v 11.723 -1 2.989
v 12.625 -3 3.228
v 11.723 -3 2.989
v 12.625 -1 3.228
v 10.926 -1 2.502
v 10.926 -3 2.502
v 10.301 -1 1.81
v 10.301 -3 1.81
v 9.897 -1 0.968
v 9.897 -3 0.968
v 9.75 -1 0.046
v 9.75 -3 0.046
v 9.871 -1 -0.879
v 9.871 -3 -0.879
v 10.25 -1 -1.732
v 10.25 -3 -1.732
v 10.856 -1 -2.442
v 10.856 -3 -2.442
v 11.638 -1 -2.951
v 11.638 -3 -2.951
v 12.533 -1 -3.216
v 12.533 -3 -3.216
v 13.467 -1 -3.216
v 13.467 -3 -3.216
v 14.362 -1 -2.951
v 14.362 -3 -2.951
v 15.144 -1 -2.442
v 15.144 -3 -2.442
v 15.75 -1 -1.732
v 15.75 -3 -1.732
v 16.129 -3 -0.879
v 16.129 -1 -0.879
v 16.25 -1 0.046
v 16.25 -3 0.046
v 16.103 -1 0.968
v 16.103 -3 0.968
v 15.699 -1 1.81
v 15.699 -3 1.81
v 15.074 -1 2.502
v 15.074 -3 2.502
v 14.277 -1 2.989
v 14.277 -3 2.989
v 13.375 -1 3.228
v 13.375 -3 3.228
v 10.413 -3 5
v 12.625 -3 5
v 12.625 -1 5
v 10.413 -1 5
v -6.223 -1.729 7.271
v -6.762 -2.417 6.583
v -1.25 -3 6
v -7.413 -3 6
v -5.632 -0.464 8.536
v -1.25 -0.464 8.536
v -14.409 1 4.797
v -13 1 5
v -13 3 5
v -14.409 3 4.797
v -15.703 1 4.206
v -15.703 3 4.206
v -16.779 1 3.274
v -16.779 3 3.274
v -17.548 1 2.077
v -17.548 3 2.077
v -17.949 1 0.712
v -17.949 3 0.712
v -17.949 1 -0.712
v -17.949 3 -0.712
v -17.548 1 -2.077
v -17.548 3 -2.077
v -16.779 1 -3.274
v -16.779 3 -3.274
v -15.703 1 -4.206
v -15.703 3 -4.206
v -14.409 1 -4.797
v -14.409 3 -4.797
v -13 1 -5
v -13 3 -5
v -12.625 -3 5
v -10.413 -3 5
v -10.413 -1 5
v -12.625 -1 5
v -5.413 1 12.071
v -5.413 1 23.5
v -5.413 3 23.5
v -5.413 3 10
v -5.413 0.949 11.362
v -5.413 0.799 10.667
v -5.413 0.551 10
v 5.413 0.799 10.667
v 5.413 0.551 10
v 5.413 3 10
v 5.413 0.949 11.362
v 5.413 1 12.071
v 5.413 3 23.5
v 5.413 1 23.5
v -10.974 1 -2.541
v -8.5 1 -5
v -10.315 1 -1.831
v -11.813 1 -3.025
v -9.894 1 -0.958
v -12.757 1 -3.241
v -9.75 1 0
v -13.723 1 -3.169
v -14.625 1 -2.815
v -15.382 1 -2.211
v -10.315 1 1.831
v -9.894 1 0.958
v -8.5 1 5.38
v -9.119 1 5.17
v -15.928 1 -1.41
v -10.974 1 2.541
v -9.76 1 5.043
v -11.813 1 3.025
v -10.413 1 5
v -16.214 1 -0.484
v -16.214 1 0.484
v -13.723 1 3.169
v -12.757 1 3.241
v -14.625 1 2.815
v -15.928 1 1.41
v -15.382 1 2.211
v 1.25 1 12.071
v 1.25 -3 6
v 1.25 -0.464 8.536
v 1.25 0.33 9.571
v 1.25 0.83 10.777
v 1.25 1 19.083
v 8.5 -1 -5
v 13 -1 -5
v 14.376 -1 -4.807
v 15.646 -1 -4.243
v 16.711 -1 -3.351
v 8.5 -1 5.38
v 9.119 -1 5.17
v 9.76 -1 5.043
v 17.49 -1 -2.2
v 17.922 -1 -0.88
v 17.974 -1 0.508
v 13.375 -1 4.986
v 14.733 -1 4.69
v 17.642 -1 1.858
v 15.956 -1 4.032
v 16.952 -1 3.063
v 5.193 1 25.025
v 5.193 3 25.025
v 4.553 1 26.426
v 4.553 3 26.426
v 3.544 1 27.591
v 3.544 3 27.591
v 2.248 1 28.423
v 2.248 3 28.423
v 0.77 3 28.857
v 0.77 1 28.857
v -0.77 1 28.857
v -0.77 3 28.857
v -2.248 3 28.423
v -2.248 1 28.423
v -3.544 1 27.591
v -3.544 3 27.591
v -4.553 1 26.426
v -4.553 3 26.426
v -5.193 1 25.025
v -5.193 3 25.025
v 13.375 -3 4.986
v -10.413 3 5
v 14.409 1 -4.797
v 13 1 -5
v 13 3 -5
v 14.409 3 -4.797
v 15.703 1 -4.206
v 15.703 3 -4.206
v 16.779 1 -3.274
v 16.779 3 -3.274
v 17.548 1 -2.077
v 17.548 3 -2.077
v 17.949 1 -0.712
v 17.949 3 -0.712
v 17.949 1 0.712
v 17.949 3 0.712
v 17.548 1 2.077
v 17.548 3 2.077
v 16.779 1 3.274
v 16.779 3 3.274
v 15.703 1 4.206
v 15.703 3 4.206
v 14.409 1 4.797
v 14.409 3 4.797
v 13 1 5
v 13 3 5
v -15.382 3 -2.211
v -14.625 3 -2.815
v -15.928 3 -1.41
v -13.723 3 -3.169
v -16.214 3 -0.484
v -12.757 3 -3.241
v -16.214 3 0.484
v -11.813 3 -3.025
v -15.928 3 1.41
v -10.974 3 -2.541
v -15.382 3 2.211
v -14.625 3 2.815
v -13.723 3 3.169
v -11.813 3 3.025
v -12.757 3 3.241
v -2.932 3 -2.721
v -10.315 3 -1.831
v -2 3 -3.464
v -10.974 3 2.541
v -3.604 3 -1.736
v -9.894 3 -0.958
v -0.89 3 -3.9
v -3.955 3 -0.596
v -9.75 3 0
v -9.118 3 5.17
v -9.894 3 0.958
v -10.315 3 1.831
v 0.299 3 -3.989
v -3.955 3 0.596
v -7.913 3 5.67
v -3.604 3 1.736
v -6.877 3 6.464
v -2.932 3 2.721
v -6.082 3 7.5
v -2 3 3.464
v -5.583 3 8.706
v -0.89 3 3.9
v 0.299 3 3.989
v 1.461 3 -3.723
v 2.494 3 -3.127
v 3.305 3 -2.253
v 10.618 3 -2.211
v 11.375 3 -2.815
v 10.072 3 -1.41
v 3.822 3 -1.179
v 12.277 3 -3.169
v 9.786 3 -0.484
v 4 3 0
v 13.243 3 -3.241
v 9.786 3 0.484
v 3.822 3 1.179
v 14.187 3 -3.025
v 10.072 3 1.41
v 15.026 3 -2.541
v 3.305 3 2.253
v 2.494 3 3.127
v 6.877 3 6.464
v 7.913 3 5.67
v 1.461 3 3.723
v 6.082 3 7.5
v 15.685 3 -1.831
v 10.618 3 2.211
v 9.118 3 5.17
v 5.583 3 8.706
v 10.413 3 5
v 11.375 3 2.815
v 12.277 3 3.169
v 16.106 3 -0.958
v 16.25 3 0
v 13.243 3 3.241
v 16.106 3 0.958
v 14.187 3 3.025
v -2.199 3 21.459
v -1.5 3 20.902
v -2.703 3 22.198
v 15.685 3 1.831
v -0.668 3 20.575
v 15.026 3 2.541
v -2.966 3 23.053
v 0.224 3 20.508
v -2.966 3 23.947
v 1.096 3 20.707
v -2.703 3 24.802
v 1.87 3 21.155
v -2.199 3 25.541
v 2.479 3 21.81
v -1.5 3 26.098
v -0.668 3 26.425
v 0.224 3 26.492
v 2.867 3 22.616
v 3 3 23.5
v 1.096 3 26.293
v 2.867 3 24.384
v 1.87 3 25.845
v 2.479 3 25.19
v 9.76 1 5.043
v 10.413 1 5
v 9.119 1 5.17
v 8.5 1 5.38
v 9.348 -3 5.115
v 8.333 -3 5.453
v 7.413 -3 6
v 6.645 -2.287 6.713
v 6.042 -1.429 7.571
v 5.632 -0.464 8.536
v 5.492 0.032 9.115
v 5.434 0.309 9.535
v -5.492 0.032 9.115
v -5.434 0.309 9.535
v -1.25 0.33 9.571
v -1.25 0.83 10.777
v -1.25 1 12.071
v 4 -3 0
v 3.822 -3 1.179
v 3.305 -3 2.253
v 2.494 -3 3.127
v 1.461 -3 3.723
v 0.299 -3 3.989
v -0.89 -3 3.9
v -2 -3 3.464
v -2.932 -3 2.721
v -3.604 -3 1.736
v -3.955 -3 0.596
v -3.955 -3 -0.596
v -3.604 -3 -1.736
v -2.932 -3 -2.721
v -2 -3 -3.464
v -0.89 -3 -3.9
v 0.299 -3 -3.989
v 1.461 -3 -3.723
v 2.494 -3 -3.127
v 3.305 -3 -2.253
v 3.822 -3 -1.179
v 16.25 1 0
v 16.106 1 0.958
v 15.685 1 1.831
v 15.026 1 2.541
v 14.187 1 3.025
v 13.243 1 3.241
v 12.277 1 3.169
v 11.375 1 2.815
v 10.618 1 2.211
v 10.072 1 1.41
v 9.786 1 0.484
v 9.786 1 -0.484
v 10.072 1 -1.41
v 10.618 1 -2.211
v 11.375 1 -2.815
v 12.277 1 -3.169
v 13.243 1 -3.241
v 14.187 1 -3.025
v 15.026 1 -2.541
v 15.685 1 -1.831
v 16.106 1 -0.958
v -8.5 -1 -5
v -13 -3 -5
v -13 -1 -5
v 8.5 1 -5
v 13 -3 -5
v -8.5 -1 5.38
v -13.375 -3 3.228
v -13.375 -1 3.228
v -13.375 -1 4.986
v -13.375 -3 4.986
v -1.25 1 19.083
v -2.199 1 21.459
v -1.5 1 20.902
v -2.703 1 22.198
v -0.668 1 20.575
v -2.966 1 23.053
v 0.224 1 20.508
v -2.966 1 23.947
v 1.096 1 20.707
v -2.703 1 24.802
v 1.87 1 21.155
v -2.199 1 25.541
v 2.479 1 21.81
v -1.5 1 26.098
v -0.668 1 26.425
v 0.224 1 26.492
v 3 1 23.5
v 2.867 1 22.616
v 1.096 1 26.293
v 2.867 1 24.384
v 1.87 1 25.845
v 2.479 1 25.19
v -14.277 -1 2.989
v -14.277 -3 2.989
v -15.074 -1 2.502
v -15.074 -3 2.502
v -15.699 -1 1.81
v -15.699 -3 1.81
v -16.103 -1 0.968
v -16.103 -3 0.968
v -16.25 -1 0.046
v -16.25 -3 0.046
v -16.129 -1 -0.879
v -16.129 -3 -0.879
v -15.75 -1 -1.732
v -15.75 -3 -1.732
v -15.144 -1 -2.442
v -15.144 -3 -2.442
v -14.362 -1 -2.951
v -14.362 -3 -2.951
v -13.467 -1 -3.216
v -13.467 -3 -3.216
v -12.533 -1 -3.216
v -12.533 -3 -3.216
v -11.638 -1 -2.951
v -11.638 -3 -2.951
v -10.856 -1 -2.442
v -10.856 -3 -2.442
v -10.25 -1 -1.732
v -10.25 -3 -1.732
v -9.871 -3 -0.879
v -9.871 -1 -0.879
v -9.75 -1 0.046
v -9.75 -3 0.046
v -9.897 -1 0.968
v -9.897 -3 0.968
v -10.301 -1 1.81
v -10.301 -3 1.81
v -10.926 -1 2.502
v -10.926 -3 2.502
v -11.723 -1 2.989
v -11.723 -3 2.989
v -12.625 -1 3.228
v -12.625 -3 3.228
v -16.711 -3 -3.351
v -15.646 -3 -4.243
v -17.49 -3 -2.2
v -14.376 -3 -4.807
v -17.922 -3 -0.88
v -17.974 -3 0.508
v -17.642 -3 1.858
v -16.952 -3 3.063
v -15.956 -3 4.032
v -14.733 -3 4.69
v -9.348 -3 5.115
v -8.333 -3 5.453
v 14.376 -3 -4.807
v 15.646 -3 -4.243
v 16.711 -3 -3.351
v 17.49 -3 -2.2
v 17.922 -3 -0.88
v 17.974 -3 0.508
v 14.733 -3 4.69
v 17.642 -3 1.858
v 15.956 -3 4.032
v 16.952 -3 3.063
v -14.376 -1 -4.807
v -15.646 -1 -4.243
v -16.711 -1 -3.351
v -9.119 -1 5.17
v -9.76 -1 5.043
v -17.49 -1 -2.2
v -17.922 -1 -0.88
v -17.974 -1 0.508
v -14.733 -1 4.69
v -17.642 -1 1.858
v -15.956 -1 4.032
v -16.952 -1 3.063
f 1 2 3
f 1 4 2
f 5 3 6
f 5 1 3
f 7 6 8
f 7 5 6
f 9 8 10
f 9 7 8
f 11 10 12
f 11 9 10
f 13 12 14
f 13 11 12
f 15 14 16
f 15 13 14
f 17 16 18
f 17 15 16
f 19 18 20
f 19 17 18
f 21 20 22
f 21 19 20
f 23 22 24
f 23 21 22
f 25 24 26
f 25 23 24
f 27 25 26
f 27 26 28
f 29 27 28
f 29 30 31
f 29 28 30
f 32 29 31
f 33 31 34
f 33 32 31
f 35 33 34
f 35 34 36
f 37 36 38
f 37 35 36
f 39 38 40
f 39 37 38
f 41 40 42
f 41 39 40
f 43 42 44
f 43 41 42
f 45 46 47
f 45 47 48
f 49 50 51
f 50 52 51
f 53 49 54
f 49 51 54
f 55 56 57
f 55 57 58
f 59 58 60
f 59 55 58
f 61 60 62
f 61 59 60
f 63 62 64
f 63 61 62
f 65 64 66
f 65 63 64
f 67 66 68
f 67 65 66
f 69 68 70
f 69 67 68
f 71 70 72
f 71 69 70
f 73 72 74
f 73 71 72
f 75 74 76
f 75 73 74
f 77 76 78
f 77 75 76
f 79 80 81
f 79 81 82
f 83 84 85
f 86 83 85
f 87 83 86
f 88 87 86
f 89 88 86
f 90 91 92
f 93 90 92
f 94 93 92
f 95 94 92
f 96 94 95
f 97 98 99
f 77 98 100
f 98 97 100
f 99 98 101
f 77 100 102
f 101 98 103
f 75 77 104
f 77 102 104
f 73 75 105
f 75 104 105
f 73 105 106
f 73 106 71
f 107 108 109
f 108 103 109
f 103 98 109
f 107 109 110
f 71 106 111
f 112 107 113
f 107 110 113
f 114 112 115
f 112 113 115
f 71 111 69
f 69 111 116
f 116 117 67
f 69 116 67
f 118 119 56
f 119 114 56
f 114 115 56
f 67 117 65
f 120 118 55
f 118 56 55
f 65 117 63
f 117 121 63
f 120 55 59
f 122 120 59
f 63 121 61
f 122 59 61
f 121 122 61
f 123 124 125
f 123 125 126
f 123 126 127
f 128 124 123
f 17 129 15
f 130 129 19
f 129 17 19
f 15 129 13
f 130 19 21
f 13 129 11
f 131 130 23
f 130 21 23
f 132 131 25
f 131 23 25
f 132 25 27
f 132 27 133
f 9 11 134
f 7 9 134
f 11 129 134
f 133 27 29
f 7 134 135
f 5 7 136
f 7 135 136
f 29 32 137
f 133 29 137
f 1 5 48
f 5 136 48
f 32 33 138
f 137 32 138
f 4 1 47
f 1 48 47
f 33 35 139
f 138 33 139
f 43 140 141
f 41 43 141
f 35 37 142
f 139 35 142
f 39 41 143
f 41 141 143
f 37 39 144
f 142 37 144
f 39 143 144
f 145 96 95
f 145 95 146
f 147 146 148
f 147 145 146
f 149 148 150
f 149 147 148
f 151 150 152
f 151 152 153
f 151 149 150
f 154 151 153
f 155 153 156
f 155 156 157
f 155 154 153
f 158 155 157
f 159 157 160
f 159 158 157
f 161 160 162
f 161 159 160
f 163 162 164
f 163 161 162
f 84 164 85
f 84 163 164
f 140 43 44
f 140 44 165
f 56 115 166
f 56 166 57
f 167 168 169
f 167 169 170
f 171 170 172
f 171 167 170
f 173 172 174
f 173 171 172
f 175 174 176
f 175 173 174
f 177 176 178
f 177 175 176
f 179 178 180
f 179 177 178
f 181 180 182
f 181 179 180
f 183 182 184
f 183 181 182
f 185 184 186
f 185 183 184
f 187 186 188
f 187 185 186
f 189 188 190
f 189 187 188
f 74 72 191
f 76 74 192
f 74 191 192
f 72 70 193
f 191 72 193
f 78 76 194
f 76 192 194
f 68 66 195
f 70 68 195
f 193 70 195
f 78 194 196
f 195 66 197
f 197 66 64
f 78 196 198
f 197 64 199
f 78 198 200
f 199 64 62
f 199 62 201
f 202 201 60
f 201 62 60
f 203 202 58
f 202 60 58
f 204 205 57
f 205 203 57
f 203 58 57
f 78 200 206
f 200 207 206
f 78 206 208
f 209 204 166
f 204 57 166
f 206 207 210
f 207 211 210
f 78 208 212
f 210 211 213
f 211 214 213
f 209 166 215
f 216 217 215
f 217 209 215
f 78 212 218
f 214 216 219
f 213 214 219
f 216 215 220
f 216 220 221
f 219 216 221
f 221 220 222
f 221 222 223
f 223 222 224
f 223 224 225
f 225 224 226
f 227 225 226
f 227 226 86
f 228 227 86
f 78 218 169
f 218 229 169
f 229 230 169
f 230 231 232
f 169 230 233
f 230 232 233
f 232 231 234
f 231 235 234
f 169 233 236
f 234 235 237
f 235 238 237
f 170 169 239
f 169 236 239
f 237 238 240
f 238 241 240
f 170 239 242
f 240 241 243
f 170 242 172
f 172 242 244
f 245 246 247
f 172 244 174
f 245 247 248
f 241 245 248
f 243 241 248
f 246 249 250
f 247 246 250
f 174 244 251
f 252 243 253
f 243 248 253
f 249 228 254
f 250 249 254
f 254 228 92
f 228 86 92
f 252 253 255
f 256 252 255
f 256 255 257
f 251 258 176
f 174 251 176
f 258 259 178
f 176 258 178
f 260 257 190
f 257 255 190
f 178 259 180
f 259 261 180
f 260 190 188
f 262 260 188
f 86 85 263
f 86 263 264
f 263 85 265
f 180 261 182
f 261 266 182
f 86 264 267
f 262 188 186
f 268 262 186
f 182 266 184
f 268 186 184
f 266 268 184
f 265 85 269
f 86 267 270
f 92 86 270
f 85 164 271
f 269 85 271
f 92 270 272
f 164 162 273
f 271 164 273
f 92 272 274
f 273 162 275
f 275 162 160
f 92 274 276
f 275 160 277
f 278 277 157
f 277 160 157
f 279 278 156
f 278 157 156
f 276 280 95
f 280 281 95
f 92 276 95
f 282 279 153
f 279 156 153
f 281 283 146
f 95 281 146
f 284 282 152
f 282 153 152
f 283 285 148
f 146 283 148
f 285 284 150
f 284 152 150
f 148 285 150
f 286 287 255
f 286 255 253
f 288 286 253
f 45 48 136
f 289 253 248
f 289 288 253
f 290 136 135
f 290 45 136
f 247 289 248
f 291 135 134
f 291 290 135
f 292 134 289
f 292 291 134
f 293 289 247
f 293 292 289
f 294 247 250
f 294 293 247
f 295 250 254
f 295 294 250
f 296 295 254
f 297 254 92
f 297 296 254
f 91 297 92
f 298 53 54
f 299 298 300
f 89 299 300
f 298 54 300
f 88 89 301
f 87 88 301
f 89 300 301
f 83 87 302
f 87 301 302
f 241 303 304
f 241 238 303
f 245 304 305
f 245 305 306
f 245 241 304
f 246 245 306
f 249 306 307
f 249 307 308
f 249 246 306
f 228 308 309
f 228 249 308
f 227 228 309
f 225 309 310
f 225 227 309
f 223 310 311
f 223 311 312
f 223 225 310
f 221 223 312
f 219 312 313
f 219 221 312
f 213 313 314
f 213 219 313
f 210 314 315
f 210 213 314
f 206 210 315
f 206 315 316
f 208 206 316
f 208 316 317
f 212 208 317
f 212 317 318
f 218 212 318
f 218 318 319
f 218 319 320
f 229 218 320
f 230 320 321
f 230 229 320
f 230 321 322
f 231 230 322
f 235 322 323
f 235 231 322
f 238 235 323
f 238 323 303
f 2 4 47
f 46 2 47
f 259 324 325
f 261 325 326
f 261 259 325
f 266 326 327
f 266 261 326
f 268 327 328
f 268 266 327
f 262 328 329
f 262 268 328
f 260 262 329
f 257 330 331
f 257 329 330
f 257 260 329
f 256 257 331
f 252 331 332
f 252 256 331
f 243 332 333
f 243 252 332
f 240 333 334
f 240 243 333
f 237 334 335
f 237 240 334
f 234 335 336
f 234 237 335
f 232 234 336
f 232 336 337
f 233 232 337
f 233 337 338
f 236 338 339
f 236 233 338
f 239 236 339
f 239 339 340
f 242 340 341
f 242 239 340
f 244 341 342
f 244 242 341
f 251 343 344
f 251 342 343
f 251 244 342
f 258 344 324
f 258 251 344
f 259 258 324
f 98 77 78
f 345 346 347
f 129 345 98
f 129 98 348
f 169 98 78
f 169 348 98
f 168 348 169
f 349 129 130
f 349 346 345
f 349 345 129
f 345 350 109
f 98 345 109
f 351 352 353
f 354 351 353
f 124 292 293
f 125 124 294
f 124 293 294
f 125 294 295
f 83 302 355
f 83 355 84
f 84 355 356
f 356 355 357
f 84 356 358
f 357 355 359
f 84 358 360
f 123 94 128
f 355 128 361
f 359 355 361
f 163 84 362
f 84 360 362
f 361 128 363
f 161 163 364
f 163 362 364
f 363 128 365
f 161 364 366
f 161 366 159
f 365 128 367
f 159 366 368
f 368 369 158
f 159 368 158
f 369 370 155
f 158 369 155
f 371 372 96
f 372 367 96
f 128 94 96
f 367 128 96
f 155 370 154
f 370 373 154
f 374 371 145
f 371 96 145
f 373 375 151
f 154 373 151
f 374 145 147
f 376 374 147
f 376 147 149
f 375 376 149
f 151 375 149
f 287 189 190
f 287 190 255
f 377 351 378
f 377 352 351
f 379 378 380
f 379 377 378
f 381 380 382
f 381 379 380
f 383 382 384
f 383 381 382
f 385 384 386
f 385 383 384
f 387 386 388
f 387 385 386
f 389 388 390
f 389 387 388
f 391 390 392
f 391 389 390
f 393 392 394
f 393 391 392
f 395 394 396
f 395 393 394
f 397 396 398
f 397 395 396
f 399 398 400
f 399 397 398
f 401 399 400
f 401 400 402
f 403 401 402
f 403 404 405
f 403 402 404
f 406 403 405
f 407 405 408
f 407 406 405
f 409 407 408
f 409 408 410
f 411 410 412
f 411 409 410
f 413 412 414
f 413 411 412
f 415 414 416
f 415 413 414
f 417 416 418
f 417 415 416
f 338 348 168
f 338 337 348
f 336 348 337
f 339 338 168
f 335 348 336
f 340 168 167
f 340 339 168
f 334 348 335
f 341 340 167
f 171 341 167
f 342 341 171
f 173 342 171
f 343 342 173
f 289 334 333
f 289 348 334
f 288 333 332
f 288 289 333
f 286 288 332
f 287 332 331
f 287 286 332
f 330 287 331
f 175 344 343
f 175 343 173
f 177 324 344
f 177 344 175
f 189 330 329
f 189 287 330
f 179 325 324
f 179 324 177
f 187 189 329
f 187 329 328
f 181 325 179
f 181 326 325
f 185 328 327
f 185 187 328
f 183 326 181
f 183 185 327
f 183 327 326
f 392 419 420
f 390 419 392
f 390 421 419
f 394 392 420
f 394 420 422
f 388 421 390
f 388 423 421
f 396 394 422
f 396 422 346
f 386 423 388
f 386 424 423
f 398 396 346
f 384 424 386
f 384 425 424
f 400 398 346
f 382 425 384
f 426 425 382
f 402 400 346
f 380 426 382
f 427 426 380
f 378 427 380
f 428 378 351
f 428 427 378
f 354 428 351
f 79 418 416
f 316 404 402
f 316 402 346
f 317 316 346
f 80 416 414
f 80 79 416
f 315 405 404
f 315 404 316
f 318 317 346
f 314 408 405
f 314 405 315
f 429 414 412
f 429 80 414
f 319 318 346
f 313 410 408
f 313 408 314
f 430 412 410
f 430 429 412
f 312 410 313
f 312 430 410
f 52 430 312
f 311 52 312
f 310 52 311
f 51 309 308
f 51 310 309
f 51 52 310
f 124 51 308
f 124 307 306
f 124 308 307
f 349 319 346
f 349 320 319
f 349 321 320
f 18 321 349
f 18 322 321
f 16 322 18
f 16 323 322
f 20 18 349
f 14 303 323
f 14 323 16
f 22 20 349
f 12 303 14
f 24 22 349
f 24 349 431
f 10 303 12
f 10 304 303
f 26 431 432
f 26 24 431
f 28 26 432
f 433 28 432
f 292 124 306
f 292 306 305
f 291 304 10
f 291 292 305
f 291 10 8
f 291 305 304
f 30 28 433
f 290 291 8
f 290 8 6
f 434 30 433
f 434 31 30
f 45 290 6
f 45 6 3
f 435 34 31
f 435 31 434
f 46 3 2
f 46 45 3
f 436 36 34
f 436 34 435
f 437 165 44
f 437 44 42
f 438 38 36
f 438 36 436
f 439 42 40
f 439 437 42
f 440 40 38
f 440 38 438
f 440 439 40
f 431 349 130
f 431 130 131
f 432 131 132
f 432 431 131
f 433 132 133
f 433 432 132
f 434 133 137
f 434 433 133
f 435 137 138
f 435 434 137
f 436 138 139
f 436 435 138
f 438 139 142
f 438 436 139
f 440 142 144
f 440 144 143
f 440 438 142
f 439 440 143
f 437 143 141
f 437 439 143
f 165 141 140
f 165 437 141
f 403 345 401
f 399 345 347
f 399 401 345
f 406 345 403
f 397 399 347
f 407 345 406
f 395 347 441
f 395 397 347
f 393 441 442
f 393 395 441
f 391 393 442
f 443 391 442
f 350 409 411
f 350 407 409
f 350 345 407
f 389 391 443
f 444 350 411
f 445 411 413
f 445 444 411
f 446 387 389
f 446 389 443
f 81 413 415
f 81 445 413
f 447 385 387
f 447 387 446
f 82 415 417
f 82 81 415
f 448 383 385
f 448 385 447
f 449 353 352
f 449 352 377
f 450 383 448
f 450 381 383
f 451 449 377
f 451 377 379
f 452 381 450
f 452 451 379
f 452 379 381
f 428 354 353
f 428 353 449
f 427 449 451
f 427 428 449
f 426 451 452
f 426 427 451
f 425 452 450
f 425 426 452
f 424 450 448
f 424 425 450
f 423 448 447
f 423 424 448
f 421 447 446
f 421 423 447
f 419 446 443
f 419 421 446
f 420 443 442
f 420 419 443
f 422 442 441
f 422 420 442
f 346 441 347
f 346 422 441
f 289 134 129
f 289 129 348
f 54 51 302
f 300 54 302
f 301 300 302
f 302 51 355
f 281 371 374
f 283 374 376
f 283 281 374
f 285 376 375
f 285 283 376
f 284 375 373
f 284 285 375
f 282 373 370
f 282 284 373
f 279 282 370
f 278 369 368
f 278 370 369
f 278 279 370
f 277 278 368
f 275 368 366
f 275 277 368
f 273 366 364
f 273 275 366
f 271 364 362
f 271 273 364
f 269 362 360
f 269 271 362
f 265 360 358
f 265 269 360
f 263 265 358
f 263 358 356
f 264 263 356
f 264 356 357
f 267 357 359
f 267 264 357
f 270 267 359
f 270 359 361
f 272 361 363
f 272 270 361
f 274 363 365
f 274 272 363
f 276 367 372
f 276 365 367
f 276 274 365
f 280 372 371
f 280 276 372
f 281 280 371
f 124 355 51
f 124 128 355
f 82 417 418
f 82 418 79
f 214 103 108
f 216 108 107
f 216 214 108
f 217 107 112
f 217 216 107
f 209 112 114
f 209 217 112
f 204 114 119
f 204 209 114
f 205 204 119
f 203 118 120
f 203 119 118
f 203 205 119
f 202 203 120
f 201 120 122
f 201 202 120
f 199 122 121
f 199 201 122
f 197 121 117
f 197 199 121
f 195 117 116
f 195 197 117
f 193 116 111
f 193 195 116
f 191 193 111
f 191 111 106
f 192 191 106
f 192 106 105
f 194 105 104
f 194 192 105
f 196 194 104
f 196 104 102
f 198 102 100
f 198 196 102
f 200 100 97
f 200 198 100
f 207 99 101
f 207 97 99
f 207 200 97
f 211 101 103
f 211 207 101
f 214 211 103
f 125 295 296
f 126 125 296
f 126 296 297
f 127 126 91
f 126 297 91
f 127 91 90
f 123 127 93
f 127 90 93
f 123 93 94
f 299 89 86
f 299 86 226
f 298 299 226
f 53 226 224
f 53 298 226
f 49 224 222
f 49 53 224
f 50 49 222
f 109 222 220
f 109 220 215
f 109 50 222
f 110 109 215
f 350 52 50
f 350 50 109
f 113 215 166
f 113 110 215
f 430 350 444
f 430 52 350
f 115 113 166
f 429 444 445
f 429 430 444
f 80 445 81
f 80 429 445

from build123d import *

# Parameters (mm, degrees)
F0_R     = 3.25
F0_R_2   = 4
F0_R_3   = 3
F1_DEPTH = 3
F3_DEPTH = 12.5
F5_DEPTH = 1.25
F6_W     = 9.5
F6_H     = 2
F7_DEPTH = 12.5
F8_W     = 0.75
F8_H     = 4
F9_DEPTH = 2


# Not quite as in the source:
# - a pattern or mirror of a feature is missing from the dataset's text; its kind, count and spacing are read off the source's solid


with BuildPart() as f1:
    # F0 (on Front) → F1 (new body, symmetric)
    with BuildSketch(Plane.XZ):
        with BuildLine():
            Line((-13, -5), (13, -5))
            ThreePointArc((13, -5), (18, 0), (13, 5))
            Line((13, 5), (10.4125417955, 5))
            ThreePointArc((10.4125417955, 5), (6.8770078896, 6.4644660941), (5.4125417955, 10))
            Line((5.4125417955, 10), (5.4125417955, 6))
            Line((5.4125417955, 6), (-5.4125417955, 6))
            Line((-5.4125417955, 6), (-5.4125417955, 10))
            ThreePointArc((-5.4125417955, 10), (-6.8770078896, 6.4644660941), (-10.4125417955, 5))
            Line((-10.4125417955, 5), (-13, 5))
            ThreePointArc((-13, 5), (-18, 0), (-13, -5))
        make_face()
        with Locations((-13, 0)):
            Circle(F0_R, mode=Mode.SUBTRACT)
        Circle(F0_R_2, mode=Mode.SUBTRACT)
        with Locations((13, 0)):
            Circle(F0_R, mode=Mode.SUBTRACT)
        with BuildLine():
            Line((5.4125417955, 6), (5.4125417955, 10))
            Line((5.4125417955, 10), (5.4125417955, 23.5))
            ThreePointArc((5.4125417955, 23.5), (0, 28.9125417955), (-5.4125417955, 23.5))
            Line((-5.4125417955, 23.5), (-5.4125417955, 10))
            Line((-5.4125417955, 10), (-5.4125417955, 6))
            Line((-5.4125417955, 6), (5.4125417955, 6))
        make_face()
        with Locations((0, 23.5)):
            Circle(F0_R_3, mode=Mode.SUBTRACT)
    extrude(amount=F1_DEPTH, both=True)

    # F2 (on Right) → F3 (cut, symmetric)
    with BuildSketch(Plane.YZ):
        with BuildLine():
            Line((1, 28.9125417955), (-3, 28.9125417955))
            Line((-3, 28.9125417955), (-3, 23.5))
            Line((-3, 23.5), (-3, 10))
            Line((-3, 10), (-3, 6))
            Line((-3, 6), (-0.4644660941, 8.5355339059))
            ThreePointArc((-0.4644660941, 8.5355339059), (0.6193976626, 10.15765065), (1, 12.0710678119))
            Line((1, 12.0710678119), (1, 28.9125417955))
        make_face()
    extrude(amount=F3_DEPTH, both=True, mode=Mode.SUBTRACT)

    # F4 (on Right) → F5 (join, symmetric)
    with BuildSketch(Plane.YZ):
        Polygon((1, 19.0834104739), (-3, 6), (1.3459398516, 6), (1.3459398516, 20.2149287434), align=None)
    extrude(amount=F5_DEPTH, both=True)

    # F6 (on Top) → F7 (cut, symmetric)
    with BuildSketch(Plane.XY):
        with Locations((13.25, 0)):
            Rectangle(F6_W, F6_H)
    f7 = extrude(amount=F7_DEPTH, both=True, mode=Mode.SUBTRACT)

    # F7_copies: F7 across plane
    add(f7.mirror(Plane(origin=(0, 0, 0), x_dir=(0, 0, -1), z_dir=(-1, 0, 0))), mode=Mode.SUBTRACT)

    # F8 (on face) → F9 (cut)
    with BuildSketch(Plane.XZ.offset(3)):
        with Locations((13, 5)):
            Rectangle(F8_W, F8_H)
    f9 = extrude(amount=-F9_DEPTH, mode=Mode.SUBTRACT)

    # F9_copies: F9 across plane
    add(f9.mirror(Plane(origin=(0, 0, 0), x_dir=(0, 0, -1), z_dir=(-1, 0, 0))), mode=Mode.SUBTRACT)


solid = f1.part
